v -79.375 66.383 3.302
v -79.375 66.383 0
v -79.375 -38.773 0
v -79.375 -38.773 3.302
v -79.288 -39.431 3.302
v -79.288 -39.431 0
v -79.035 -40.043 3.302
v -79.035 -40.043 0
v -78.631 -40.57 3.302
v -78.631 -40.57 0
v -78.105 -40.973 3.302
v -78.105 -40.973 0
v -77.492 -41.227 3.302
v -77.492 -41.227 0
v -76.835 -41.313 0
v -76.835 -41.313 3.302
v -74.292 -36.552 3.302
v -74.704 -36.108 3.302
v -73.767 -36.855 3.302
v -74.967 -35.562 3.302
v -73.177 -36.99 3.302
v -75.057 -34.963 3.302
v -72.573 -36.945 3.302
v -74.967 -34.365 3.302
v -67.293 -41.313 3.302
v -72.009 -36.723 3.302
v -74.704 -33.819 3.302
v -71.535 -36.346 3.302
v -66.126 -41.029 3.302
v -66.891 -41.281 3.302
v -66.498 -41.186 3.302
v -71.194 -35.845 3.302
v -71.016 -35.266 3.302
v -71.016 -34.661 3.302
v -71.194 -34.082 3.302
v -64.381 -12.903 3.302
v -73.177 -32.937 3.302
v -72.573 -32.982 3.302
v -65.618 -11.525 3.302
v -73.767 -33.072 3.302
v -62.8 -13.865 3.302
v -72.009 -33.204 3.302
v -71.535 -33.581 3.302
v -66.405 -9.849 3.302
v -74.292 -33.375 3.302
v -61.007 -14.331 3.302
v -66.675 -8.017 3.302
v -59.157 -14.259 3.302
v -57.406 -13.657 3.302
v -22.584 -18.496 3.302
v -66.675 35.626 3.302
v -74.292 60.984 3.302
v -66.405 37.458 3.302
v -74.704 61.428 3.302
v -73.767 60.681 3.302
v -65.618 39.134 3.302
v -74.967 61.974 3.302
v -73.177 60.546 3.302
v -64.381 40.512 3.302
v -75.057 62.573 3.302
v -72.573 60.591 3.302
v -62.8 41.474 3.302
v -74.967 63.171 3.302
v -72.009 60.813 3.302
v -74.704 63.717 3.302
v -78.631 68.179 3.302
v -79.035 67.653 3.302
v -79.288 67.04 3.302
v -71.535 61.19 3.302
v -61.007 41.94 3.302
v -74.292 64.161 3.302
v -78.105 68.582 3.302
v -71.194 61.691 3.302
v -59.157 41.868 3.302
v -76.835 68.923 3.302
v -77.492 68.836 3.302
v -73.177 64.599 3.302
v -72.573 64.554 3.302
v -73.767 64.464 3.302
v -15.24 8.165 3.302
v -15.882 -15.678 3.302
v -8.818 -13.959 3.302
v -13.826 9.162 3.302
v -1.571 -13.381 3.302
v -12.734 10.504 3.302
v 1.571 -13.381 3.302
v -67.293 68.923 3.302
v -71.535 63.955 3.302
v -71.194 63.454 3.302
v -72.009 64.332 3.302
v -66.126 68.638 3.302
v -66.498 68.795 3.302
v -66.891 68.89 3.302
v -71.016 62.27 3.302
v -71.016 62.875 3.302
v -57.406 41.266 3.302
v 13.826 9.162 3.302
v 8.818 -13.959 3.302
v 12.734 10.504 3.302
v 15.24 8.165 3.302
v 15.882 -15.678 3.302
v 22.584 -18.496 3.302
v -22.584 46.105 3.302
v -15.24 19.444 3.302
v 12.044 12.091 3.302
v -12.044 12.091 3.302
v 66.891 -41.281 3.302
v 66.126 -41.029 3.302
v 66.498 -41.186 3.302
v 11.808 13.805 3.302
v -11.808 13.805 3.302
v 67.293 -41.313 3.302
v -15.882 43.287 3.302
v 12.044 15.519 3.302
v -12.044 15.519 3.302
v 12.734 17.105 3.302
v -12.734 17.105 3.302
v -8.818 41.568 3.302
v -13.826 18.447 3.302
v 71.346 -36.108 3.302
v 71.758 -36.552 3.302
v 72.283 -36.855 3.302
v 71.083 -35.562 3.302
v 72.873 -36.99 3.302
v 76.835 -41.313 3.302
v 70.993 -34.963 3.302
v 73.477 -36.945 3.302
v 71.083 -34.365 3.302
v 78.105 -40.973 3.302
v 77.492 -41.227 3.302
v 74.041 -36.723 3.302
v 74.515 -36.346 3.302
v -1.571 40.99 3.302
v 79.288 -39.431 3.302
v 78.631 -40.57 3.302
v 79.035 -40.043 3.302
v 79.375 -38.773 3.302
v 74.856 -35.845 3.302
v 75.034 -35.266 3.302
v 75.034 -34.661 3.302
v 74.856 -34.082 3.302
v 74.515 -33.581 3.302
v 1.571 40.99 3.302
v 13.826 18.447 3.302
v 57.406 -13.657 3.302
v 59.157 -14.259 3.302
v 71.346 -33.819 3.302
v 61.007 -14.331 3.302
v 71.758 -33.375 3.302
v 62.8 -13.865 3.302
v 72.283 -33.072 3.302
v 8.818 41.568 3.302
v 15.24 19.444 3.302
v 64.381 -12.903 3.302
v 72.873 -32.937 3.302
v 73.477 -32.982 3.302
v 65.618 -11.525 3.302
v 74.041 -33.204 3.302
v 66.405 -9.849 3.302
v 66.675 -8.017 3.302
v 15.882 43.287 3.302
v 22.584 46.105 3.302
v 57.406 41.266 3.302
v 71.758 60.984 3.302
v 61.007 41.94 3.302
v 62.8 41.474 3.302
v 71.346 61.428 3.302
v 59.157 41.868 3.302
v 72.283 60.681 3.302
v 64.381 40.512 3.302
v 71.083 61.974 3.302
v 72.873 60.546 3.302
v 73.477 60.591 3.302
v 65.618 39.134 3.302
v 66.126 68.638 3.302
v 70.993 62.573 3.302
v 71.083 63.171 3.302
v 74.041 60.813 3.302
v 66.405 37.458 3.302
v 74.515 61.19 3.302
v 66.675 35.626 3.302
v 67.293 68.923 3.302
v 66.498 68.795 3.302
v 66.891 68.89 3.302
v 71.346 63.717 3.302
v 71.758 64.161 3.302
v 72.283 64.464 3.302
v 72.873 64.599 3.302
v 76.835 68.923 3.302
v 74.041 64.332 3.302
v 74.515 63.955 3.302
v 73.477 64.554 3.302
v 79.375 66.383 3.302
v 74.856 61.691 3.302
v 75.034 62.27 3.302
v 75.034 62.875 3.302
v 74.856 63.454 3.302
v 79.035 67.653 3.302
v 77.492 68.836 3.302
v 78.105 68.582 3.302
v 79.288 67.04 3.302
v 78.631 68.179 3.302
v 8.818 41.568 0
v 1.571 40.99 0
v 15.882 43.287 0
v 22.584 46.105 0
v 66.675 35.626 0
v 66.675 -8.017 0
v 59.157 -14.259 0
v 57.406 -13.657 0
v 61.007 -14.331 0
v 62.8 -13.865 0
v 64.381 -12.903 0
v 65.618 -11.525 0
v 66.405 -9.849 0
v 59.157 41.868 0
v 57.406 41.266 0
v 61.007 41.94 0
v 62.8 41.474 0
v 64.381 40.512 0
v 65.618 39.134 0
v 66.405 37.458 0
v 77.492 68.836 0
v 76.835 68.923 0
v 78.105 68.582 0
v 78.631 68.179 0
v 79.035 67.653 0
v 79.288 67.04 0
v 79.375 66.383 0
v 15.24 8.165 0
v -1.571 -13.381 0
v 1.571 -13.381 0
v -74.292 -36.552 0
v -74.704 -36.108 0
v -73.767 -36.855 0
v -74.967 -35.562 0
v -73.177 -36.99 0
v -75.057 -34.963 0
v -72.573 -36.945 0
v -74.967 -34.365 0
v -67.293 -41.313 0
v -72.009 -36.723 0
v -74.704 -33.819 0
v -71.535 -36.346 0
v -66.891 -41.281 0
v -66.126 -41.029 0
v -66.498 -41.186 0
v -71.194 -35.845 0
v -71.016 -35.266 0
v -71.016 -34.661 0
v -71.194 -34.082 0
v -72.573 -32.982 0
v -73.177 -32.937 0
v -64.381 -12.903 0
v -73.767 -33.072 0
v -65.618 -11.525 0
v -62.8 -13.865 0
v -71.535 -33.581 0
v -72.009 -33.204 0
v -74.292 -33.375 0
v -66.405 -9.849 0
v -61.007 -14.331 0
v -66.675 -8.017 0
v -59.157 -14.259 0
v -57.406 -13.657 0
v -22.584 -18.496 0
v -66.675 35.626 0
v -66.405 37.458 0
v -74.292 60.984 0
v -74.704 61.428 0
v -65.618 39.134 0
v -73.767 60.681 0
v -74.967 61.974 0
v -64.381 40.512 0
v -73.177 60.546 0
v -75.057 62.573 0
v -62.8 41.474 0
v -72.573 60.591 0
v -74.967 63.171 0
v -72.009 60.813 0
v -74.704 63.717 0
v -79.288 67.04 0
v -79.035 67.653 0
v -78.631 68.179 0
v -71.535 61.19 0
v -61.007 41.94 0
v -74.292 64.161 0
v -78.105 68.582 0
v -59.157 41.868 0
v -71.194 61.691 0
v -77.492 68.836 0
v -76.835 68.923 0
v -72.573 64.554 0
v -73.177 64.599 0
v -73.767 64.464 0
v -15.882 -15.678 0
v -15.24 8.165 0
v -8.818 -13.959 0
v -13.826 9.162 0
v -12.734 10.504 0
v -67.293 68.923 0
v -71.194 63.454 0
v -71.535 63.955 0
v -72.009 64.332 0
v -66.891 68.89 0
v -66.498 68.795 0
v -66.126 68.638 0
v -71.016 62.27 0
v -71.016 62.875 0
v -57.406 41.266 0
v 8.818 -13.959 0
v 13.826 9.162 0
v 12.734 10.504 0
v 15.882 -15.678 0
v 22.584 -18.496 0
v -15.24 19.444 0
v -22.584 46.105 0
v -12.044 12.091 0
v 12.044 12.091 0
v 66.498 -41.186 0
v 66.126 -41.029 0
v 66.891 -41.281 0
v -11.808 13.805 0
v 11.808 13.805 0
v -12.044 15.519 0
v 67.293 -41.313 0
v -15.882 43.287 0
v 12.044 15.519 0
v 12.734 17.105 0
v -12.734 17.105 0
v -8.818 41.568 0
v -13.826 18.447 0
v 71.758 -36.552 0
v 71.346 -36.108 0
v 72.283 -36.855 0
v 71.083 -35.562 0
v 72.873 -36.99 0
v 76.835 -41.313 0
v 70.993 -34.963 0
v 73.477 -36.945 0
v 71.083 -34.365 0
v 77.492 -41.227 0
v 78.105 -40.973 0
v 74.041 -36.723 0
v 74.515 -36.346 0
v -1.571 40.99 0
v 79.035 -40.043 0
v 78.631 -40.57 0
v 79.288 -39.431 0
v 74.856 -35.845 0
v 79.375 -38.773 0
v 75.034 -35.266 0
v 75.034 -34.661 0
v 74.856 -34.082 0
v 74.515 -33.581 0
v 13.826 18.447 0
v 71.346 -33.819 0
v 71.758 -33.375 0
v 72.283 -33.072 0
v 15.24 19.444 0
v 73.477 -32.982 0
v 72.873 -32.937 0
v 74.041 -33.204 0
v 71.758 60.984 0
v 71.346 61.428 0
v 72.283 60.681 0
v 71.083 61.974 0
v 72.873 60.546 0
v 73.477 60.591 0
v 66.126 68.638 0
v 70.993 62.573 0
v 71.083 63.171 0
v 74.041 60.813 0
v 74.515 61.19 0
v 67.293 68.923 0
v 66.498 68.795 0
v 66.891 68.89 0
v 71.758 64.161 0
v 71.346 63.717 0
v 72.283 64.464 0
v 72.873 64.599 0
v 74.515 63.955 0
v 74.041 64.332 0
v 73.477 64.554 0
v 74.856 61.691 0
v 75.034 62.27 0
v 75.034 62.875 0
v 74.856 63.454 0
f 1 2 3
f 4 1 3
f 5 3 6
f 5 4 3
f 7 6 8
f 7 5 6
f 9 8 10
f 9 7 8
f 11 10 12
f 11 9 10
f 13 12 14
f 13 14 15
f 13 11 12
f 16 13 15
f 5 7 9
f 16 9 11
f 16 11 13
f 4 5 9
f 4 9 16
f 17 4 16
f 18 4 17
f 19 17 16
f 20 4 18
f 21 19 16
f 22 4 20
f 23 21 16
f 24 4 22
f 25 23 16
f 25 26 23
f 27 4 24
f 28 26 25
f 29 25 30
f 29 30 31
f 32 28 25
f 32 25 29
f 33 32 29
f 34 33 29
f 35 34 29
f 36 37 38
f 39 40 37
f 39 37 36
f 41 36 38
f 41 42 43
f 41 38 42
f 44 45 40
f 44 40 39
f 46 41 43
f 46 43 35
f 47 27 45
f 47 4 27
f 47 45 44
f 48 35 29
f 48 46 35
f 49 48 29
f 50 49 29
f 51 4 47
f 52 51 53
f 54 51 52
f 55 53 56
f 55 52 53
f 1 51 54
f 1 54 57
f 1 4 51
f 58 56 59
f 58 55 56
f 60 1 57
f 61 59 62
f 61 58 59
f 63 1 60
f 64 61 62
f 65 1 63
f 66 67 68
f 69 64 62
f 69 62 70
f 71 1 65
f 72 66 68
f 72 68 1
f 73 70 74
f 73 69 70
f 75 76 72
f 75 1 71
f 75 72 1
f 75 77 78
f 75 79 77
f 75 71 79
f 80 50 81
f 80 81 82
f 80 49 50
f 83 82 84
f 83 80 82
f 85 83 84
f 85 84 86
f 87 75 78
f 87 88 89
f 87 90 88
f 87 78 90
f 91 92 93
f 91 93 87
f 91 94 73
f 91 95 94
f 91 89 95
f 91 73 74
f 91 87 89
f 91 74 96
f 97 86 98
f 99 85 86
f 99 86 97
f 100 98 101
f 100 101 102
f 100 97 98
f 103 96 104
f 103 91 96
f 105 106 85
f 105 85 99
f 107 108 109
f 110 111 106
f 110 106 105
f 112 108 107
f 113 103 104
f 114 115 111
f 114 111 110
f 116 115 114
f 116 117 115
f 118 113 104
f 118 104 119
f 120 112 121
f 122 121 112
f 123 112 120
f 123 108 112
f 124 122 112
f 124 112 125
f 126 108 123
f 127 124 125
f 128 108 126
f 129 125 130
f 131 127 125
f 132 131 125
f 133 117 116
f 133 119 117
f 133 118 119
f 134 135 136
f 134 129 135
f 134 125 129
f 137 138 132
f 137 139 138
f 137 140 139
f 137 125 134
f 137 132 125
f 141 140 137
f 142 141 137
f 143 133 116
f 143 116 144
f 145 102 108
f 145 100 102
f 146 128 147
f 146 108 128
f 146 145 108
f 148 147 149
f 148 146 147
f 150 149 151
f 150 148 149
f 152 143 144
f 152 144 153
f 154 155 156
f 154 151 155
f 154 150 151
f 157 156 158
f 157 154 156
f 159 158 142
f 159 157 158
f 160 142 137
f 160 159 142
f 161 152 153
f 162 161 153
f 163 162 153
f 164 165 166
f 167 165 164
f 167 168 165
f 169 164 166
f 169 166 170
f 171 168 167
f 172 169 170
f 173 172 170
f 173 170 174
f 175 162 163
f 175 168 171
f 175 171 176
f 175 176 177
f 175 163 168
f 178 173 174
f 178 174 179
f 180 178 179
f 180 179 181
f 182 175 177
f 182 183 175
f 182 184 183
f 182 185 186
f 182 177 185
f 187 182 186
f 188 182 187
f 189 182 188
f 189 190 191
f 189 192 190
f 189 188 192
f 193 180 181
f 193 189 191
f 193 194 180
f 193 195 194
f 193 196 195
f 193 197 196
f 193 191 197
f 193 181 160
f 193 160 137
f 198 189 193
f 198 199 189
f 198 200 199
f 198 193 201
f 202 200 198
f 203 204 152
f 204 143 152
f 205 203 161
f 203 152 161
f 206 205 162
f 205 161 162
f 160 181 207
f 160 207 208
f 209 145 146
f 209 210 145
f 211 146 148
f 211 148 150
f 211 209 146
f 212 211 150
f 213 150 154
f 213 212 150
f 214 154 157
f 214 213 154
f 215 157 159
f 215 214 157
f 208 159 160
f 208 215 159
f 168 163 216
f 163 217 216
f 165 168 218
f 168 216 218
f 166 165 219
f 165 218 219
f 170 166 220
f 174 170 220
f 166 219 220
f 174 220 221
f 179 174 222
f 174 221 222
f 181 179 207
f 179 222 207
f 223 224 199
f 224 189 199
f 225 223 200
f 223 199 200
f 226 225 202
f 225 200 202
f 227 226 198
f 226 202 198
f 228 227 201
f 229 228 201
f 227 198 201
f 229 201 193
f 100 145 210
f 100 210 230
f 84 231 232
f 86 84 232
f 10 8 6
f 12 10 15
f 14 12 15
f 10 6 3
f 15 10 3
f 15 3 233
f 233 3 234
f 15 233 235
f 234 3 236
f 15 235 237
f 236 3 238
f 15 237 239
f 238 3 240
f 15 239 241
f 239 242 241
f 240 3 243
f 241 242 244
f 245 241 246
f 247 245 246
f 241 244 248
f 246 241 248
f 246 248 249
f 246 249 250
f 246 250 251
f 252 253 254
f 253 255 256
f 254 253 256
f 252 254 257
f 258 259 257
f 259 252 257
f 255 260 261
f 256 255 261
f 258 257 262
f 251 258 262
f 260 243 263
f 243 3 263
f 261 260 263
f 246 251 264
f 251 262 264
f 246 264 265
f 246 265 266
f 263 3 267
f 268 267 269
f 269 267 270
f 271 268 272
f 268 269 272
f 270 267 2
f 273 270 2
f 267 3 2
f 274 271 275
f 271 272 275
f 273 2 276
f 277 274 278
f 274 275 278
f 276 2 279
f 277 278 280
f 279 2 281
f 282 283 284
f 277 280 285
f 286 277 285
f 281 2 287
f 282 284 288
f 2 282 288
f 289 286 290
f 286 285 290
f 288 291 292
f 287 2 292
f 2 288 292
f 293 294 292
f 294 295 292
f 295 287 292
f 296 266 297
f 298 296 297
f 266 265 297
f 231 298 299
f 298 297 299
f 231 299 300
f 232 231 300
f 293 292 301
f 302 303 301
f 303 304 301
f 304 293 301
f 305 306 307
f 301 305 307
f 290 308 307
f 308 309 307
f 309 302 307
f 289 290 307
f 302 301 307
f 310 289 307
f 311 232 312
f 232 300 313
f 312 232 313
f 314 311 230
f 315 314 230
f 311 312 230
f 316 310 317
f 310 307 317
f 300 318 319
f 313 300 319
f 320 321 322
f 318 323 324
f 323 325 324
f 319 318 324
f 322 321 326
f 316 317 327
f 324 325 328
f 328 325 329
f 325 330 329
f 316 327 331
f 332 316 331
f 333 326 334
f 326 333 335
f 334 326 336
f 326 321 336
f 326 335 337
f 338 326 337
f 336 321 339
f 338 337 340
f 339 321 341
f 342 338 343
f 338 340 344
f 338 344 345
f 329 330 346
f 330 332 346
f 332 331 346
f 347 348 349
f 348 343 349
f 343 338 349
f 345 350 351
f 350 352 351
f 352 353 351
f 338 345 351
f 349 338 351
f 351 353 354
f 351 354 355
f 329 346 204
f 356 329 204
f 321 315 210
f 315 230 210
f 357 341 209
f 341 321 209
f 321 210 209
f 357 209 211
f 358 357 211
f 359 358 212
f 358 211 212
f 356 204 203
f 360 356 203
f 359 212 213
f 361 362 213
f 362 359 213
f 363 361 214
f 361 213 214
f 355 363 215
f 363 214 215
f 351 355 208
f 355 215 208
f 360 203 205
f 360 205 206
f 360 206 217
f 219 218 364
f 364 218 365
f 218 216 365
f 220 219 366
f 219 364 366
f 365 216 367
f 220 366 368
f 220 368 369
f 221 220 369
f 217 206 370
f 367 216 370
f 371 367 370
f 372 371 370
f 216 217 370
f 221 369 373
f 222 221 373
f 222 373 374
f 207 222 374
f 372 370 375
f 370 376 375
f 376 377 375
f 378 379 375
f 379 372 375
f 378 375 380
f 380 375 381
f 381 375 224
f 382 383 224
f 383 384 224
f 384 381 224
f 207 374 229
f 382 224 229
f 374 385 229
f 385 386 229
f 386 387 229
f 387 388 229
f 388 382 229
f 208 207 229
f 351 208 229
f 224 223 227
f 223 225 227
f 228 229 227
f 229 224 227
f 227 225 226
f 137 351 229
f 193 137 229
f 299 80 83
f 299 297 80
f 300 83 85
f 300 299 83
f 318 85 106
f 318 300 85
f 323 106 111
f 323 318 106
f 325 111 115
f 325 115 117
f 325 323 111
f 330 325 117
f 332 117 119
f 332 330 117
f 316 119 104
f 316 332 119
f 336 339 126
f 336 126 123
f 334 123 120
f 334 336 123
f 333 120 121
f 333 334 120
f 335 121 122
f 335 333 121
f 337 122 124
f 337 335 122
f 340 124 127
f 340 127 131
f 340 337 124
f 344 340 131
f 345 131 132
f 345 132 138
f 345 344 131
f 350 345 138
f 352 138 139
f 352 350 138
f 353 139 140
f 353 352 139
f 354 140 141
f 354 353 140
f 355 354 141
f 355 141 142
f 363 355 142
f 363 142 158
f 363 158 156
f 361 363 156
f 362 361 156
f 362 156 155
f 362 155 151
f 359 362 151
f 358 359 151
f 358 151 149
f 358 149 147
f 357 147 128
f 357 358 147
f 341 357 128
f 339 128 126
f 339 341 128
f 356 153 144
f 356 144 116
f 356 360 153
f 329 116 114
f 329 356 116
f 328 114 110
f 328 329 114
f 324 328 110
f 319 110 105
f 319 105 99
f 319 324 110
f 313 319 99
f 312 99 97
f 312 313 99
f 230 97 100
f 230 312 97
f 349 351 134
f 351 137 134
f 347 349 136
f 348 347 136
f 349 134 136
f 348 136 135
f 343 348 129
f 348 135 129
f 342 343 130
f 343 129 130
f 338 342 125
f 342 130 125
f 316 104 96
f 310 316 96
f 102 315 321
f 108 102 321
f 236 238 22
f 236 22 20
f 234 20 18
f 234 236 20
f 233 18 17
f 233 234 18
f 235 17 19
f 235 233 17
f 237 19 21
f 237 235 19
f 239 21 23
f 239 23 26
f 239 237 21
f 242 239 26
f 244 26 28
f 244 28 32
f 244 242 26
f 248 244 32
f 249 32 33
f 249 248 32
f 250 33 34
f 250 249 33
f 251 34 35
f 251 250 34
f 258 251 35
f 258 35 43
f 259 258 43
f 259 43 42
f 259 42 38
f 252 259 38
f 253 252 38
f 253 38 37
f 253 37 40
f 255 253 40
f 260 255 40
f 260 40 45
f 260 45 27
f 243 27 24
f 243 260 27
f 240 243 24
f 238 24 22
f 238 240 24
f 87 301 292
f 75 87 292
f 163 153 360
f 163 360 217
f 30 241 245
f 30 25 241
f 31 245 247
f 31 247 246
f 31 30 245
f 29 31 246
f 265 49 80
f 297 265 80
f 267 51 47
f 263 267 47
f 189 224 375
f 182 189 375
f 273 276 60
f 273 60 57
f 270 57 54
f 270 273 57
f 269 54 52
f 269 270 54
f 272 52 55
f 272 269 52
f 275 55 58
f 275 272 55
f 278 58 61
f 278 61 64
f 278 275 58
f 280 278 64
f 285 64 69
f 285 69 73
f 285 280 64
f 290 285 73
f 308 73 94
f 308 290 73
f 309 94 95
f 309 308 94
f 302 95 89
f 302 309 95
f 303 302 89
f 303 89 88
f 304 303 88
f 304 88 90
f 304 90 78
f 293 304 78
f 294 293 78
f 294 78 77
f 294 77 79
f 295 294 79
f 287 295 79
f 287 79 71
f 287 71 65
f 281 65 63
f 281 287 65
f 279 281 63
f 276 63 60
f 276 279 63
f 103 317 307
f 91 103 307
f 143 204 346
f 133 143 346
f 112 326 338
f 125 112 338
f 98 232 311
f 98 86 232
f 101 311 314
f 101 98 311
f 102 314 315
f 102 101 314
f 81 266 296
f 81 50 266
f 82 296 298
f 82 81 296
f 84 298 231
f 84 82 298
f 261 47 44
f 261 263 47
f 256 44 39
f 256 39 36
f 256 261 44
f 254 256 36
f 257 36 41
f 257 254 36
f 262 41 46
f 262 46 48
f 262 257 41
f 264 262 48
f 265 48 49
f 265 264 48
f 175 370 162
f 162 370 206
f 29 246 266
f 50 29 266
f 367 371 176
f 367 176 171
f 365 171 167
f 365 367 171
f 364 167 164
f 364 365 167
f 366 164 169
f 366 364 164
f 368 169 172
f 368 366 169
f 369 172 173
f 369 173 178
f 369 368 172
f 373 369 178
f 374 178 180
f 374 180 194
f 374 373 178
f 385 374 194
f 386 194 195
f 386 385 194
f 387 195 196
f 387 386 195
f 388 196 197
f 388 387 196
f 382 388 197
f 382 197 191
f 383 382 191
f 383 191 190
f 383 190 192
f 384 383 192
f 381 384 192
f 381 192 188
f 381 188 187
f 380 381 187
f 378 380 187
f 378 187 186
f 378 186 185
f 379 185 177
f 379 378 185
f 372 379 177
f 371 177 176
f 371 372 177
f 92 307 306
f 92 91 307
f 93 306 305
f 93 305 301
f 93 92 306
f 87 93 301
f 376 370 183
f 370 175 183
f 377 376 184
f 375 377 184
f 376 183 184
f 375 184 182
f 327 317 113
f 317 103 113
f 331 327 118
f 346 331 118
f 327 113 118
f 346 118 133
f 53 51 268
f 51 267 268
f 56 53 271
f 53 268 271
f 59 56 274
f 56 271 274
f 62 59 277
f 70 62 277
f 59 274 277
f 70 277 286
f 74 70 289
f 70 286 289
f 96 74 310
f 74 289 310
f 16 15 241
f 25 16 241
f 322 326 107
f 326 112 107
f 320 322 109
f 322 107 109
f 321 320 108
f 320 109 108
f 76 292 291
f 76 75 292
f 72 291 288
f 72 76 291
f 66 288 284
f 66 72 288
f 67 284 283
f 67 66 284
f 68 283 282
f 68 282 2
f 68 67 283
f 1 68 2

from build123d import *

# Parameters (mm, degrees)
SKETCH1_R           = 2.032
BOSS_EXTRUDE1_DEPTH = 3.302
FILLET1_R           = 45.72
FILLET2_R           = 2.54
CUT_EXTRUDE1_DEPTH  = 106.174191833
FILLET3_R           = 6.35


with BuildPart() as part:
    # Sketch1 → Boss-Extrude1 (new body)
    with BuildSketch(Plane.XY):
        Polygon((-79.375, 68.922542022), (-79.375, -41.313457978), (-66.675, -41.313457978), (-12.7, -13.38067482), (12.7, -13.38067482), (66.675, -41.313457978), (79.375, -41.313457978), (79.375, 68.922542022), (66.675, 68.922542022), (12.7, 40.989758863), (-12.7, 40.989758863), (-66.675, 68.922542022), align=None)
        with Locations(Location((-73.025, 62.572542022, 0), (0, 0, 180))):
            Circle(SKETCH1_R, mode=Mode.SUBTRACT)
        with Locations(Location((-73.025, -34.963457978, 0), (0, 0, 180))):
            Circle(SKETCH1_R, mode=Mode.SUBTRACT)
        with Locations(Location((73.025, -34.963457978, 0), (0, 0, 180))):
            Circle(SKETCH1_R, mode=Mode.SUBTRACT)
        with Locations(Location((73.025, 62.572542022, 0), (0, 0, 180))):
            Circle(SKETCH1_R, mode=Mode.SUBTRACT)
    extrude(amount=BOSS_EXTRUDE1_DEPTH)

    # Fillet1
    fillet1_edges = [part.edges().sort_by_distance(p)[0] for p in [
        (-12.7, 40.989758863, 1.651),
        (12.7, 40.989758863, 1.651),
        (12.7, -13.38067482, 1.651),
        (-12.7, -13.38067482, 1.651),
    ]]
    fillet(fillet1_edges, radius=FILLET1_R)

    # Fillet2
    fillet2_edges = [part.edges().sort_by_distance(p)[0] for p in [
        (-66.675, 68.922542022, 1.651),
        (66.675, 68.922542022, 1.651),
        (79.375, 68.922542022, 1.651),
        (79.375, -41.313457978, 1.651),
        (66.675, -41.313457978, 1.651),
        (-66.675, -41.313457978, 1.651),
        (-79.375, -41.313457978, 1.651),
        (-79.375, 68.922542022, 1.651),
    ]]
    fillet(fillet2_edges, radius=FILLET2_R)

    # Sketch2 → Cut-Extrude1 (cut, through all)
    with BuildSketch(Plane.XY.offset(3.302)):
        Polygon((-66.675, 46.062542022), (-66.675, -18.453457978), (-4.342308693, 13.804542022), align=None)
        Polygon((66.675, 46.062542022), (66.675, -18.453457978), (4.342308693, 13.804542022), align=None)
    extrude(amount=-CUT_EXTRUDE1_DEPTH, mode=Mode.SUBTRACT)

    # Fillet3
    fillet3_edges = [part.edges().sort_by_distance(p)[0] for p in [
        (-4.342308693, 13.804542022, 1.651),
        (-66.675, -18.453457978, 1.651),
        (-66.675, 46.062542022, 1.651),
        (4.342308693, 13.804542022, 1.651),
        (66.675, 46.062542022, 1.651),
        (66.675, -18.453457978, 1.651),
    ]]
    fillet(fillet3_edges, radius=FILLET3_R)


solid = part.part
